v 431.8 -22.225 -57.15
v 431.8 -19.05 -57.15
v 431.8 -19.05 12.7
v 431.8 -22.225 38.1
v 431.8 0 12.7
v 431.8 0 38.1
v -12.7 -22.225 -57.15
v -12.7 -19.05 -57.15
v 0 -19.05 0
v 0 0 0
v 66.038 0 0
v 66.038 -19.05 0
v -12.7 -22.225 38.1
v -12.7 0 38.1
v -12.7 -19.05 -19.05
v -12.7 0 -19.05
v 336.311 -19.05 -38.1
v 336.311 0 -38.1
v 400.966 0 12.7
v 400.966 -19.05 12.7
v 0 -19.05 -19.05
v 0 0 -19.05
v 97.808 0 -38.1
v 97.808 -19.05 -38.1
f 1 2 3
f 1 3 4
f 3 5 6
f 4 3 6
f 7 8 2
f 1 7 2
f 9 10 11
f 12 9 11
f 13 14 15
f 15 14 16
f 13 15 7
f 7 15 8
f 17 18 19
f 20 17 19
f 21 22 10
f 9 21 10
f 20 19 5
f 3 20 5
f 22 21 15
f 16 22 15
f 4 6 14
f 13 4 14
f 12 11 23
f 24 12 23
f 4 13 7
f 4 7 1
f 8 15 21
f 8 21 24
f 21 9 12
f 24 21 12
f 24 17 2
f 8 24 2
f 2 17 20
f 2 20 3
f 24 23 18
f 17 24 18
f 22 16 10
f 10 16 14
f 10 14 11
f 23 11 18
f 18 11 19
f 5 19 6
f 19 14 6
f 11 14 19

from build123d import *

# Parameters (mm, degrees)
BOSS_EXTRUDE1_DEPTH = 19.05
SKETCH2_R           = 3.96875
CUT_EXTRUDE1_DEPTH  = 19.05
SKETCH3_W           = 457.2
SKETCH3_H           = 152.4
BOSS_EXTRUDE3_DEPTH = 19.05
SKETCH4_W           = 457.2
SKETCH4_H           = 152.4
CUT_EXTRUDE2_DEPTH  = 25.4
CUT_EXTRUDE3_DEPTH  = 25.4
BOSS_EXTRUDE4_DEPTH = 3.175


with BuildPart() as part:
    # Sketch1 → Boss-Extrude1 (new body)
    with BuildSketch(Plane(origin=(0, 0, 0), x_dir=(1, 0, 0), z_dir=(0, 1, 0))):
        Polygon((57.15, 19.05), (0, 19.05), (0, 0), (66.037825848, 0), (97.808358016, 38.1), (336.311308439, 38.1), (400.965853894, -12.7), (431.8, -12.7), (342.9, 57.15), (88.9, 57.15), align=None)
    extrude(amount=BOSS_EXTRUDE1_DEPTH)

    # Sketch2 → Cut-Extrude1 (cut)
    with BuildSketch(Plane.XY):
        with Locations((8.89, 9.525)):
            Circle(SKETCH2_R)
        with Locations((56.515, 9.525)):
            Circle(SKETCH2_R)
    extrude(amount=-CUT_EXTRUDE1_DEPTH, mode=Mode.SUBTRACT)

    # Sketch4 → Cut-Extrude2 (cut)
    with BuildSketch(Plane(origin=(0, 0, 0), x_dir=(1, 0, 0), z_dir=(0, 1, 0))):
        with Locations((215.9, 38.1)):
            Rectangle(SKETCH4_W, SKETCH4_H)
    extrude(amount=CUT_EXTRUDE2_DEPTH, mode=Mode.SUBTRACT)


with BuildPart() as body_2:
    # Sketch3 → Boss-Extrude3 (new body)
    with BuildSketch(Plane.XZ):
        with Locations((215.9, -38.1)):
            Rectangle(SKETCH3_W, SKETCH3_H)
        Polygon((400.965853894, 12.7), (431.8, 12.7), (342.9, -57.15), (88.9, -57.15), (57.15, -19.05), (0, -19.05), (0, 0), (66.037825848, 0), (97.808358016, -38.1), (336.311308439, -38.1), align=None, mode=Mode.SUBTRACT)
    extrude(amount=BOSS_EXTRUDE3_DEPTH)

    # Sketch5 → Cut-Extrude3 (cut)
    with BuildSketch(Plane.XZ.offset(19.05)):
        Polygon((57.15, -19.05), (0, -19.05), (-12.7, -19.05), (-12.7, -114.3), (444.5, -114.3), (444.5, 38.1), (431.8, 38.1), (431.8, 12.7), (342.9, -57.15), (88.9, -57.15), align=None)
    extrude(amount=-CUT_EXTRUDE3_DEPTH, mode=Mode.SUBTRACT)

    # Sketch6 → Boss-Extrude4 (add)
    with BuildSketch(Plane.XZ.offset(19.05)):
        Polygon((400.965853894, 12.7), (336.311308439, -38.1), (336.311308439, -57.15), (431.8, -57.15), (431.8, 12.7), align=None)
        Polygon((336.311308439, -57.15), (336.311308439, -38.1), (97.808358016, -38.1), (66.037825848, 0), (0, 0), (0, -19.05), (-12.7, -19.05), (-12.7, -57.15), align=None)
        Polygon((97.808358016, -38.1), (336.311308439, -38.1), (336.311308439, 38.1), (-12.7, 38.1), (-12.7, -19.05), (0, -19.05), (0, 0), (66.037825848, 0), align=None)
        Polygon((336.311308439, 38.1), (336.311308439, -38.1), (400.965853894, 12.7), (431.8, 12.7), (431.8, 38.1), align=None)
    extrude(amount=BOSS_EXTRUDE4_DEPTH)


solid = body_2.part
